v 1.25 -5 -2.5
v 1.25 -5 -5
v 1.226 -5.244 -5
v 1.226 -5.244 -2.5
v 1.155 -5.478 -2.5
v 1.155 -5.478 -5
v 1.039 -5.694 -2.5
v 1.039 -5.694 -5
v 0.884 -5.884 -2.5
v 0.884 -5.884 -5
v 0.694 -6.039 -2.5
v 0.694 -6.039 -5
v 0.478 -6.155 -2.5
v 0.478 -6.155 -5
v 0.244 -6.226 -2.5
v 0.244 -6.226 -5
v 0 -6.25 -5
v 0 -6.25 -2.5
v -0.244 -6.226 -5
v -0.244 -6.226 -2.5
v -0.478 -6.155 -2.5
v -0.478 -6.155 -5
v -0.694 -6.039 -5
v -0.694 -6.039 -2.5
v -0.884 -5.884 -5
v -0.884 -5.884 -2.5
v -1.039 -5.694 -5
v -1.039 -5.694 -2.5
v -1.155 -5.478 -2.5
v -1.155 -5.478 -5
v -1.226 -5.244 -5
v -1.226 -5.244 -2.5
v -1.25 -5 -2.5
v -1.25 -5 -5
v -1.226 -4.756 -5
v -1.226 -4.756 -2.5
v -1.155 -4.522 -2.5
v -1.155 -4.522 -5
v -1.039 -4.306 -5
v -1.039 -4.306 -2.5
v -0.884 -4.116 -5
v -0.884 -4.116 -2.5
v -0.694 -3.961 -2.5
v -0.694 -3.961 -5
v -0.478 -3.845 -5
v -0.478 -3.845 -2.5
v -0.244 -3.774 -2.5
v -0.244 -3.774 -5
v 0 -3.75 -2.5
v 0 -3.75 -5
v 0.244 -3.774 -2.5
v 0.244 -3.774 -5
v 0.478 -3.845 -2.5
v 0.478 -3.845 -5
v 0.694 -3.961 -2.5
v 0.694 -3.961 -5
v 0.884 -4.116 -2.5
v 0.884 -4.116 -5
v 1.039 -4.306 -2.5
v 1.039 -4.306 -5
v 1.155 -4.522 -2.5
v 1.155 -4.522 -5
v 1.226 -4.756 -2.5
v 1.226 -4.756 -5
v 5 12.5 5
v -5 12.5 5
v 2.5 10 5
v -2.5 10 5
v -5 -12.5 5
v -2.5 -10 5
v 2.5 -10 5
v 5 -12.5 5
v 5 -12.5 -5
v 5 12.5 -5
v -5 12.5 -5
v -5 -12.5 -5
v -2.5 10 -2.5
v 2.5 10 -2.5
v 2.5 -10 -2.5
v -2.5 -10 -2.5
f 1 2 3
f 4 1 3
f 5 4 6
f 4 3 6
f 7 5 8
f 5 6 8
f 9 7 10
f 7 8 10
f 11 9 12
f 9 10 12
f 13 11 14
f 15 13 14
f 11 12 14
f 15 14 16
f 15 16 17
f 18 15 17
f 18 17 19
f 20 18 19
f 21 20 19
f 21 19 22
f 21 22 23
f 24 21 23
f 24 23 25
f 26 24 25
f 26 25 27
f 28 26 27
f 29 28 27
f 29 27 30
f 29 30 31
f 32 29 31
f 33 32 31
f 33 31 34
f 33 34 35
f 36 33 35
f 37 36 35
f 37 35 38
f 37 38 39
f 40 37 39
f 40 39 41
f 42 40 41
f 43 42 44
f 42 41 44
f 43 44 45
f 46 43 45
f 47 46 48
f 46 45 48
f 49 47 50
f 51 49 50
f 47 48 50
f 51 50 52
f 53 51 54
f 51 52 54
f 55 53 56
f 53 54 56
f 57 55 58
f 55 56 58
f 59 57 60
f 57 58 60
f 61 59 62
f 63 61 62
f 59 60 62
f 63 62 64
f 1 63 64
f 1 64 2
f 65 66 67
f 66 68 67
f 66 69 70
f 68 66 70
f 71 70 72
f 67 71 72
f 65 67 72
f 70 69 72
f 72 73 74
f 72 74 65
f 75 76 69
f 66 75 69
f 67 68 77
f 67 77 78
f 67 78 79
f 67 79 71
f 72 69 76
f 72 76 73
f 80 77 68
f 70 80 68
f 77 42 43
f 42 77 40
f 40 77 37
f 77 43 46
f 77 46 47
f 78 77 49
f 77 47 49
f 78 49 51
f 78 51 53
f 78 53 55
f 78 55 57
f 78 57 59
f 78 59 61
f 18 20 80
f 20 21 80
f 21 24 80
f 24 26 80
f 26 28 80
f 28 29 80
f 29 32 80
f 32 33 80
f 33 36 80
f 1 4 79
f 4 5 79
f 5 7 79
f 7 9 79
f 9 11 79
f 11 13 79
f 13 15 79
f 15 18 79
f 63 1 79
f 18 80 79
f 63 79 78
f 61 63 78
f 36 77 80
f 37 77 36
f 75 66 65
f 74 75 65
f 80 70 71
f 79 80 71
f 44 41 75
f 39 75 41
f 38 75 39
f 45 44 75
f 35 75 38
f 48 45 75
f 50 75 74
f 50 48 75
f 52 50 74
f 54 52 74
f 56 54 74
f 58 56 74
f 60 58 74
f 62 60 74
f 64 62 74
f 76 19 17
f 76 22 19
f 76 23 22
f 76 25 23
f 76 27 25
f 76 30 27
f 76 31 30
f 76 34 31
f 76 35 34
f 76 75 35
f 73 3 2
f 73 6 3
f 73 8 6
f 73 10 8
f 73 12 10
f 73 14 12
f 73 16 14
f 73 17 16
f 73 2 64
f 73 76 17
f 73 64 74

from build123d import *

# Parameters (mm, degrees)
F0_W     = 10
F0_H     = 10
F1_DEPTH = 12.5
F2_T     = -2.5
F3_R     = 1.25
F4_DEPTH = 10.001


with BuildPart() as f1:
    # F0 (on Front) → F1 (new body, symmetric)
    with BuildSketch(Plane.XZ):
        Rectangle(F0_W, F0_H)
    extrude(amount=F1_DEPTH, both=True)

    # F2
    f2_openings = [f1.faces().sort_by_distance(p)[0] for p in [
        (0, 0, 5),
    ]]
    offset(amount=F2_T, openings=f2_openings)

    # F3 (on face) → F4 (cut, through all)
    with BuildSketch(Plane(origin=(0, 0, -5), x_dir=(1, 0, 0), z_dir=(0, 0, -1))):
        with Locations((0, 5)):
            Circle(F3_R)
    extrude(amount=-F4_DEPTH, mode=Mode.SUBTRACT)


solid = f1.part
